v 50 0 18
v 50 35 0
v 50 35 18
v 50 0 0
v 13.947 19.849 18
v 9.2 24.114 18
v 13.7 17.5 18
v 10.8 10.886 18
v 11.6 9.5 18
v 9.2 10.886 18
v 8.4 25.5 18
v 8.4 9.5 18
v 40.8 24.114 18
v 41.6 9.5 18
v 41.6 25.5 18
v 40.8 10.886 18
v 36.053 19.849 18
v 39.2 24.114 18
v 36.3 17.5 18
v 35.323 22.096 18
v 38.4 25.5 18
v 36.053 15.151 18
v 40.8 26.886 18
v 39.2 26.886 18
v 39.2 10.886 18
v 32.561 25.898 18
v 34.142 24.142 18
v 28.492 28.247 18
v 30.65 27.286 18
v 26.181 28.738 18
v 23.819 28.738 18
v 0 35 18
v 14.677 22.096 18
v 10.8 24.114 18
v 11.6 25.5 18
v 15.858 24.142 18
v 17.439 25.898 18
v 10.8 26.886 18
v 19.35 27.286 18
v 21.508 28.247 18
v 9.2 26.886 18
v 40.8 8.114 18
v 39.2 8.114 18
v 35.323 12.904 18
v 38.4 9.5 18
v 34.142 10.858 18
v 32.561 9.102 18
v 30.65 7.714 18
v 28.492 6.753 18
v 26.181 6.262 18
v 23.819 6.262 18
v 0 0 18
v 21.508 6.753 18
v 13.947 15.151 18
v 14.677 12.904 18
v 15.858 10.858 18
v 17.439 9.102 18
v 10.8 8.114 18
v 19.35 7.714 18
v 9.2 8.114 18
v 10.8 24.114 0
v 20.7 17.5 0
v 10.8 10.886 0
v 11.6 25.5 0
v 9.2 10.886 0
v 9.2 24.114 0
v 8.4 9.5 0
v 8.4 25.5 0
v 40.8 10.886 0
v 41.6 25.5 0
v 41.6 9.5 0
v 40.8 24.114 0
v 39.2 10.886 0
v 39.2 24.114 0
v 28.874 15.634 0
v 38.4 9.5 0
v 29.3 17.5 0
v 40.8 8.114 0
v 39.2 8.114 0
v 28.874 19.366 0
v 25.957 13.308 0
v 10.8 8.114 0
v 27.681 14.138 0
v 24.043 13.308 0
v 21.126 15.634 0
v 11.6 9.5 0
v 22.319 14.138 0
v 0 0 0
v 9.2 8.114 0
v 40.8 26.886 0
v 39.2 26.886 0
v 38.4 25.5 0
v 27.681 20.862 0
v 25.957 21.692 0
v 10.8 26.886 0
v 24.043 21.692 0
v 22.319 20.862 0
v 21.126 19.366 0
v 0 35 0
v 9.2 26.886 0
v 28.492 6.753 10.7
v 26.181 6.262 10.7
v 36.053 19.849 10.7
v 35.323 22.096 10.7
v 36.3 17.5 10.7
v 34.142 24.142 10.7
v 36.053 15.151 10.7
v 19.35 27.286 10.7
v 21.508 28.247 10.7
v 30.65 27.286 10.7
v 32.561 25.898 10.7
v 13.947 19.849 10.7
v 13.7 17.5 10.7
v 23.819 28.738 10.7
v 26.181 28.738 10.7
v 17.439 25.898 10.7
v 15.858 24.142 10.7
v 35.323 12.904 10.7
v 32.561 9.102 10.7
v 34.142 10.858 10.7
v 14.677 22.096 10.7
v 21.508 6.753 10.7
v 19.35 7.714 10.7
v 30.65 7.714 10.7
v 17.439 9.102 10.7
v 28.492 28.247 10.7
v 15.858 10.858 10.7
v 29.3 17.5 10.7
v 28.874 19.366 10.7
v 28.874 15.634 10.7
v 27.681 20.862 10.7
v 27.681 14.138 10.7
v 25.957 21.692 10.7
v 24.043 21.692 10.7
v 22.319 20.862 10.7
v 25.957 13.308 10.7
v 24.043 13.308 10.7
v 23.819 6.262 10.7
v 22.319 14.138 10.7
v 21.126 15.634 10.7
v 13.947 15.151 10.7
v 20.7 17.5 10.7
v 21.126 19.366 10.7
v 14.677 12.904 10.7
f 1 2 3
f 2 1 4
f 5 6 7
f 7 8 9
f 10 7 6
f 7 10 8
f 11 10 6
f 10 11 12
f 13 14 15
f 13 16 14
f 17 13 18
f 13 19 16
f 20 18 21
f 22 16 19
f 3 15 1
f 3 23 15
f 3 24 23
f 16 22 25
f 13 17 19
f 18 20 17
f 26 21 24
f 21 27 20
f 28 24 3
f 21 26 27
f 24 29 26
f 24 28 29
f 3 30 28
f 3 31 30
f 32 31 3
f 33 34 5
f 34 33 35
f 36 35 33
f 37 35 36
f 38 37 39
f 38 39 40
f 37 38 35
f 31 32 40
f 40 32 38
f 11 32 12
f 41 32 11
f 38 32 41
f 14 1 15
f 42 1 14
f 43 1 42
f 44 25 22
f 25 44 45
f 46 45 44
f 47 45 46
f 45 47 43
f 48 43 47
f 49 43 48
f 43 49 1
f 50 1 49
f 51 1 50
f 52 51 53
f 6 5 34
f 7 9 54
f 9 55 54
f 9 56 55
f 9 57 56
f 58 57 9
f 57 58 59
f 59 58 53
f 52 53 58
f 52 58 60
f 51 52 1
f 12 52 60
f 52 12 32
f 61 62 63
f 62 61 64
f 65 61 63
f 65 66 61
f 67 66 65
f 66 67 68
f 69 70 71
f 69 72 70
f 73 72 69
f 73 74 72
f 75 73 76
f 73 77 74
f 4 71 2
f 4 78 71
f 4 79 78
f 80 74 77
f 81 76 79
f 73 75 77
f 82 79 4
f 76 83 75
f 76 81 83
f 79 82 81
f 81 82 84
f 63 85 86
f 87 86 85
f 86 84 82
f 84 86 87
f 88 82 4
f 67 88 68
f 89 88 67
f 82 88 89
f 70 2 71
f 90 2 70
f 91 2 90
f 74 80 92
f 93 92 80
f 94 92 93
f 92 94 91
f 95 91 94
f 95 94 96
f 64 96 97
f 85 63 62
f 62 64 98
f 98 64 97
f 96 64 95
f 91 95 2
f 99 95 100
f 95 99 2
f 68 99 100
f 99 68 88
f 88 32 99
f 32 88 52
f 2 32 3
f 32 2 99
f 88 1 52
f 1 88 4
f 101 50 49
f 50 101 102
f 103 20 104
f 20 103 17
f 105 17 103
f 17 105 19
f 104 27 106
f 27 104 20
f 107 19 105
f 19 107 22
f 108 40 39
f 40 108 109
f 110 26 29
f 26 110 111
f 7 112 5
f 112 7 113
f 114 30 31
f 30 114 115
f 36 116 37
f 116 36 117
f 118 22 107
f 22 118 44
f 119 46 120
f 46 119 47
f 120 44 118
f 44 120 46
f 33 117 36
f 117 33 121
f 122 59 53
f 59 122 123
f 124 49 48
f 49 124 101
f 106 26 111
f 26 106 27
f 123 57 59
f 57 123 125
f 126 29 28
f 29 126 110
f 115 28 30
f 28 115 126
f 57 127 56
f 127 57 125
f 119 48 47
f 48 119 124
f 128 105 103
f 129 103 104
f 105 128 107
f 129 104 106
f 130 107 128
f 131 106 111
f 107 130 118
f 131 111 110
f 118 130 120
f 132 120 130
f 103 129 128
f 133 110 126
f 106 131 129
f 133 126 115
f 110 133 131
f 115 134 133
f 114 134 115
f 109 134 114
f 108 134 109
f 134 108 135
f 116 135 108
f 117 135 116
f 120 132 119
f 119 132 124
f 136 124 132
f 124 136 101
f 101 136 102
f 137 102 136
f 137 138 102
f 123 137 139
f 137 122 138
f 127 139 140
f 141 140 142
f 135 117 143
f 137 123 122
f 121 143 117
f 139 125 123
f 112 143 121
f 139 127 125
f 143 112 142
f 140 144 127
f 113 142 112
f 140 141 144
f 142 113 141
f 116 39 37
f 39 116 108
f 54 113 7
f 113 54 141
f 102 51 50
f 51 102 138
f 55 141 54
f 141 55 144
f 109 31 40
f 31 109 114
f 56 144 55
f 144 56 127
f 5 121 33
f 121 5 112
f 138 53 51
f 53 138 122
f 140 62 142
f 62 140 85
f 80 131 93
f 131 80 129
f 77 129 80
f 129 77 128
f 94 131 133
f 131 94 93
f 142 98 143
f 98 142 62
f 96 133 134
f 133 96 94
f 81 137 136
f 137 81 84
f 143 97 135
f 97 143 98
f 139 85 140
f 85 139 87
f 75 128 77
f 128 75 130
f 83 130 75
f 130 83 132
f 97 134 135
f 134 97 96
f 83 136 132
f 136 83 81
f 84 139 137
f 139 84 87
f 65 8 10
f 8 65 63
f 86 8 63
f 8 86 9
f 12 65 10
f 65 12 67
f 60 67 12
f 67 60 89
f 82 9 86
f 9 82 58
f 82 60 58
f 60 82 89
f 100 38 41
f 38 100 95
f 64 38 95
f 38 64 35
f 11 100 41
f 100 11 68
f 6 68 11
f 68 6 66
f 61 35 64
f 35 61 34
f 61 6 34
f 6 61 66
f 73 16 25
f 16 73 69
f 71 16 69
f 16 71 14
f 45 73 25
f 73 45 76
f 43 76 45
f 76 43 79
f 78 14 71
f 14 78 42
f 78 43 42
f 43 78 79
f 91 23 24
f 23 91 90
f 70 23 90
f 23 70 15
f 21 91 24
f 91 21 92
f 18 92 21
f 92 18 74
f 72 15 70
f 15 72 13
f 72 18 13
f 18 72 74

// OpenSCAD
module rj_bearing_block() {
  w = 50.0; d = 35.0; h = 18.0;
  pocket_d = 22.6; pocket_h = 7.3;
  hole_d = 3.2;
  hx = 15.0; hy = 8.0;
  difference() {
    cube([w, d, h], center=false);
    translate([w/2, d/2, h-pocket_h]) cylinder(h=pocket_h+1, d=pocket_d, center=false);
    translate([w/2, d/2, -1]) cylinder(h=h+2, d=8.6, center=false);
    translate([w/2 + -1*hx, d/2 + -1*hy, -1]) cylinder(h=h+2, d=hole_d, center=false);
    translate([w/2 + -1*hx, d/2 + 1*hy, -1]) cylinder(h=h+2, d=hole_d, center=false);
    translate([w/2 + 1*hx, d/2 + -1*hy, -1]) cylinder(h=h+2, d=hole_d, center=false);
    translate([w/2 + 1*hx, d/2 + 1*hy, -1]) cylinder(h=h+2, d=hole_d, center=false);
  }
}
rj_bearing_block();
